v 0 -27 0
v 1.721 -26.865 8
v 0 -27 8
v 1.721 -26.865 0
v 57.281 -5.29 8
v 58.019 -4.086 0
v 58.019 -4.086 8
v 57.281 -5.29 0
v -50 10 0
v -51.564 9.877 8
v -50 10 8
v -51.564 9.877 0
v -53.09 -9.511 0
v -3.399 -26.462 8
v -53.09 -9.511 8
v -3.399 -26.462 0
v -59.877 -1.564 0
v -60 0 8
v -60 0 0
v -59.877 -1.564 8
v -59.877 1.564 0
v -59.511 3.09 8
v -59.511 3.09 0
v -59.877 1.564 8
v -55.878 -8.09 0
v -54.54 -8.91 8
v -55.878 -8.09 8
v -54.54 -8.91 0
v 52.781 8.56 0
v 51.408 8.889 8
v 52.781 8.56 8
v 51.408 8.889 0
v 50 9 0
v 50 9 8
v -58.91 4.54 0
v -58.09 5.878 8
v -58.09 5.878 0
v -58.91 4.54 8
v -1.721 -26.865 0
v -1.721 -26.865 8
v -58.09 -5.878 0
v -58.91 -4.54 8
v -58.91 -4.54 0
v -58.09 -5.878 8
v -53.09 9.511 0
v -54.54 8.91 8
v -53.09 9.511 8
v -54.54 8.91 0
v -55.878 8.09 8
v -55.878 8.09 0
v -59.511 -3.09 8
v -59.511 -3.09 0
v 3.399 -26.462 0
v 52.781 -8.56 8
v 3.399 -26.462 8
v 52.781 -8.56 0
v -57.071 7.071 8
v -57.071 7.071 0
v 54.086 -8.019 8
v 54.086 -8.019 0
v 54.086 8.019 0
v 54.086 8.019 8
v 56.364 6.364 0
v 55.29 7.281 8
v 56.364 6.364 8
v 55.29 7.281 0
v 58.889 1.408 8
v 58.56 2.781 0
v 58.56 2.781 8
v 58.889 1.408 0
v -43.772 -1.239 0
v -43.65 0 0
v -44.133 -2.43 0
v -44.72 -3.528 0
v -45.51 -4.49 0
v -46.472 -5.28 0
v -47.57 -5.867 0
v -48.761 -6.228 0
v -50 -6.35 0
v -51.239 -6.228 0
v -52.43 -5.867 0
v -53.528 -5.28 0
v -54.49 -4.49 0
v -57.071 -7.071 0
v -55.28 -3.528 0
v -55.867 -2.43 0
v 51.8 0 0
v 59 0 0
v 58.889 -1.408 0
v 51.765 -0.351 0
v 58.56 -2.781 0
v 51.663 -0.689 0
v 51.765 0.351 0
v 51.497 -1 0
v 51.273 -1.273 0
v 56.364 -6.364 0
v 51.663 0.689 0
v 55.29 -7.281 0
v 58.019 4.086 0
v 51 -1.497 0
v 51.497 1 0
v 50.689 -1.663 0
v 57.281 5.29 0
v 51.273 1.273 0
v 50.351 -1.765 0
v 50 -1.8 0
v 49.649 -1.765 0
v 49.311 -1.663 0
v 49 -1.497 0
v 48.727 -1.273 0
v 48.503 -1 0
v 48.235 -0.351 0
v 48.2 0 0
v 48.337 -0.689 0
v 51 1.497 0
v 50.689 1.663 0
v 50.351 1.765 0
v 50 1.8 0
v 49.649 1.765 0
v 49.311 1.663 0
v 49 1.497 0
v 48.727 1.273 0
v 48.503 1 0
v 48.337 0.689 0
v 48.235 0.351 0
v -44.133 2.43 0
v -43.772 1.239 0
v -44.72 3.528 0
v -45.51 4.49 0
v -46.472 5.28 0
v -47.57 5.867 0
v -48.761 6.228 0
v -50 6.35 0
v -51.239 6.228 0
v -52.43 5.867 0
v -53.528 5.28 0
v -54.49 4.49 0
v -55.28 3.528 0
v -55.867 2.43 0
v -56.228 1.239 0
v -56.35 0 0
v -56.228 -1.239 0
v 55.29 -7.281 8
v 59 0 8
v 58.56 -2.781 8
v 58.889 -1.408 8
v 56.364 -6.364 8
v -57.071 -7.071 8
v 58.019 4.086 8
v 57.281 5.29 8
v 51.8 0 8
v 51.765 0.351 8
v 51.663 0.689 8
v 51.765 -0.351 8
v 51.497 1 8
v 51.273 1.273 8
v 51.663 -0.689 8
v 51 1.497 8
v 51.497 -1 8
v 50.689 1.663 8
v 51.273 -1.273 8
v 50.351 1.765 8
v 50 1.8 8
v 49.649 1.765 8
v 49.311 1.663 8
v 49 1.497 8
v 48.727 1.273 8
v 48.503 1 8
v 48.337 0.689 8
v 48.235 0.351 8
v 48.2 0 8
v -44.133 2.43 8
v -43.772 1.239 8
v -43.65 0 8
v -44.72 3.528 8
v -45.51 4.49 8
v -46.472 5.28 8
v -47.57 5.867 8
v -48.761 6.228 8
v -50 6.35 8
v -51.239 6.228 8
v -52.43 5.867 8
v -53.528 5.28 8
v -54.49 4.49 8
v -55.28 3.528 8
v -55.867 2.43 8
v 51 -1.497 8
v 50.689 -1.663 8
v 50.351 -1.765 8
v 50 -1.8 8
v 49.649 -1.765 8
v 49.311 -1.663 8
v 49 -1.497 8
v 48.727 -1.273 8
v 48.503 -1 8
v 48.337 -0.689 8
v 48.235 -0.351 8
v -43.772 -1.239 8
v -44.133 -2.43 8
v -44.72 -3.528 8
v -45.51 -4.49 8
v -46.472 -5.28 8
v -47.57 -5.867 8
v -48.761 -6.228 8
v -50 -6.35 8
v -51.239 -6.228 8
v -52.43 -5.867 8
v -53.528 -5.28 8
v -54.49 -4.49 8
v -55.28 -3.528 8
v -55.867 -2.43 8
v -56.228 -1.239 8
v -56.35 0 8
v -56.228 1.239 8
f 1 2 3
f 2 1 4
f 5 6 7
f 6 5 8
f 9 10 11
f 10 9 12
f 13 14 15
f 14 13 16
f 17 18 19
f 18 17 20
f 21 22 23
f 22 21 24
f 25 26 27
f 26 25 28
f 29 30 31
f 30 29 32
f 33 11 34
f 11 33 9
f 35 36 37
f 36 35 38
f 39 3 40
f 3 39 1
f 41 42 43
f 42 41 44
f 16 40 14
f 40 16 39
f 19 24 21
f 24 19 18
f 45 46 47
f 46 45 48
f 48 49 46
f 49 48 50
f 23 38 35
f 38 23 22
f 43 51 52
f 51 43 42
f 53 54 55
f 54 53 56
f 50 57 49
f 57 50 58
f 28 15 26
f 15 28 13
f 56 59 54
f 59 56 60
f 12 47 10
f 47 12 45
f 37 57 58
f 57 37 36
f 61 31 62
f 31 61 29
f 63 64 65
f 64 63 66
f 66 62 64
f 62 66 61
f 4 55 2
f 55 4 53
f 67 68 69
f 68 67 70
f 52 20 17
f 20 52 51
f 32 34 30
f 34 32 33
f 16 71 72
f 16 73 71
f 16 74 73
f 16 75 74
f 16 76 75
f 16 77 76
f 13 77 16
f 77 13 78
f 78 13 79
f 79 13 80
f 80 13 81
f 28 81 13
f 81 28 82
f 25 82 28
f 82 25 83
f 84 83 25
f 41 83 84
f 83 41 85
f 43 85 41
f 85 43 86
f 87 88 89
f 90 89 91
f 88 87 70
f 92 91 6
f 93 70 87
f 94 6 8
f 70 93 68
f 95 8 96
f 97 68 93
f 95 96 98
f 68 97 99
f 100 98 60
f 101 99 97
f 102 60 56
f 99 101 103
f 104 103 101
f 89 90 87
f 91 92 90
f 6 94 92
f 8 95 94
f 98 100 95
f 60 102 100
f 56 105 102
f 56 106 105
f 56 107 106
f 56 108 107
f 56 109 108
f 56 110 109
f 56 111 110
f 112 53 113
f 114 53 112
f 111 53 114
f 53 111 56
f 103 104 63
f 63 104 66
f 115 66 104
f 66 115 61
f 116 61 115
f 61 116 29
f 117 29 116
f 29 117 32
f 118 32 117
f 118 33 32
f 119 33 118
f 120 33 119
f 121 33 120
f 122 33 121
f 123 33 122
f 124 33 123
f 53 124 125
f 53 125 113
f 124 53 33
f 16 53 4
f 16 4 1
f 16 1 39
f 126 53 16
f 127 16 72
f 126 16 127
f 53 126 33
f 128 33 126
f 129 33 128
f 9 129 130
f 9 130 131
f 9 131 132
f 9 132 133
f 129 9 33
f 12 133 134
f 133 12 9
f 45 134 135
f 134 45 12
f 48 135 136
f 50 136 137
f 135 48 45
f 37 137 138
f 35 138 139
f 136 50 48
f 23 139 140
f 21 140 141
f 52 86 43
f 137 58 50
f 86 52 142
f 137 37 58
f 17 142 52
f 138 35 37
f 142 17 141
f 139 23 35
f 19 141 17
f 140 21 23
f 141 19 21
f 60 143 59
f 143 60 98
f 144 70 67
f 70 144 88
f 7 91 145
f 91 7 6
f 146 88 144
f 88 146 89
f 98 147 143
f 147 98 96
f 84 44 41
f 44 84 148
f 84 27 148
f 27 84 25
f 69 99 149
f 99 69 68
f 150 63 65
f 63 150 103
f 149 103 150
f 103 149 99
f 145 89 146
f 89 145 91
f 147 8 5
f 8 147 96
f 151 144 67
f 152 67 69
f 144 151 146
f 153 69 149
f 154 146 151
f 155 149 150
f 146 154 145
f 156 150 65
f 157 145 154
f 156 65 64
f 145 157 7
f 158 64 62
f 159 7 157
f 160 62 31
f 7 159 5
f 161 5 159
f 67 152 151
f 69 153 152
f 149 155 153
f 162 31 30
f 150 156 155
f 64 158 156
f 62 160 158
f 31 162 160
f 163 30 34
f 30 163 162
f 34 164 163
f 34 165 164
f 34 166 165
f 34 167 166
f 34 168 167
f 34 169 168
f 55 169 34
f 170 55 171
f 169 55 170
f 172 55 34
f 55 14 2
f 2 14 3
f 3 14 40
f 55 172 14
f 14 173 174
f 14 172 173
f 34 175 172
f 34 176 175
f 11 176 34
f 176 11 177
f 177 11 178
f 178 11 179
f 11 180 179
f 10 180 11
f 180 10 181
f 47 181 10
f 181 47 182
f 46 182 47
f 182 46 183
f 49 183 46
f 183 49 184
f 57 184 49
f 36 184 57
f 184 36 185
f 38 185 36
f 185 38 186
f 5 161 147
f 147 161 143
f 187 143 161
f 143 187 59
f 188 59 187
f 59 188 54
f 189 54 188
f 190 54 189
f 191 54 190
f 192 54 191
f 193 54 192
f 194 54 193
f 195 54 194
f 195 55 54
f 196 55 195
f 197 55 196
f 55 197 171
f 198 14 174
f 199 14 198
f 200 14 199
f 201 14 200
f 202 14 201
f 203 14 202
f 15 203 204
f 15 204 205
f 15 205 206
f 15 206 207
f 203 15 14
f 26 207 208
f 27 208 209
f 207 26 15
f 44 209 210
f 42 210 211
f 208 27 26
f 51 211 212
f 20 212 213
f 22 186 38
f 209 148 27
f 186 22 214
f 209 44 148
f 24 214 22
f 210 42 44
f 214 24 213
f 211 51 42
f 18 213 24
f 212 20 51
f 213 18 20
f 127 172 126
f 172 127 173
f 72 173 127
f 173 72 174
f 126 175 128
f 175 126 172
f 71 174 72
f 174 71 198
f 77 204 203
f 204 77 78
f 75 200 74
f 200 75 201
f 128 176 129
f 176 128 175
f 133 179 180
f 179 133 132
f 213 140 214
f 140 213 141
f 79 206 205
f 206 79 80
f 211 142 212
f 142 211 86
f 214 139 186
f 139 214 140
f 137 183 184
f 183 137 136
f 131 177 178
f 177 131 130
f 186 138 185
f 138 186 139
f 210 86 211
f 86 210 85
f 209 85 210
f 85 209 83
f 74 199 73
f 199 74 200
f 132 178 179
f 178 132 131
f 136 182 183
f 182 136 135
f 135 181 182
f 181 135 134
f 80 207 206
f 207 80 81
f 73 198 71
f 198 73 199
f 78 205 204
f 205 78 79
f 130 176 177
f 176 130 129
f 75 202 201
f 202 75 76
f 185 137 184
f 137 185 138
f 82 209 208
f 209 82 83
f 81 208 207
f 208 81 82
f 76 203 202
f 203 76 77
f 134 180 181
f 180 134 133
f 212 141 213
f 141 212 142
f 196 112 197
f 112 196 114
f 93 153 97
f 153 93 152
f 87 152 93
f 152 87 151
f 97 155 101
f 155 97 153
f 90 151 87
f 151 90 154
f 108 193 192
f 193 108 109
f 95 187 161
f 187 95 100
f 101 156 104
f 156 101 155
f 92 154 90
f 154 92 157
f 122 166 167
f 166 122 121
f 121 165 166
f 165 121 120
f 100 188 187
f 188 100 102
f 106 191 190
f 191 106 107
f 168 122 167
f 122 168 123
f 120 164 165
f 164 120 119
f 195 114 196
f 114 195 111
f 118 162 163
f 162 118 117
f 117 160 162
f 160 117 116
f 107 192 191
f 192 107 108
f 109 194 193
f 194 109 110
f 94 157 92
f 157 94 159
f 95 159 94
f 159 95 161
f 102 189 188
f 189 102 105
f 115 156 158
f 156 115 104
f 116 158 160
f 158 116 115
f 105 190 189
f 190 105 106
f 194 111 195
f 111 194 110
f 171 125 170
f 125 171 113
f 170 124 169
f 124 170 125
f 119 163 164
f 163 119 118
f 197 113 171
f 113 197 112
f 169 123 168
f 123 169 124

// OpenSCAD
$fn = 32;

// ----------------------------------------------------------------------
// Lever: 100 mm between the bosses, 8 mm thick, smooth outline
// ----------------------------------------------------------------------

// --- parameters (mm) ---
lever_l = 100;            // distance between the boss centres
boss_a = 20;              // first boss diameter
boss_b = 18;              // second boss diameter
bore_a = 12.7;            // first bore
bore_b = 3.6;             // second bore
lever_t = 8;              // lever thickness
boss_c = 22;              // middle boss diameter
bend = 16;                // how far the middle boss drops

lever_profile = [[-60, 0], [-59.877, -1.564], [-59.511, -3.09], [-58.91, -4.54], [-58.09, -5.878], [-57.071, -7.071], [-55.878, -8.09], [-54.54, -8.91], [-53.09, -9.511], [-3.399, -26.462], [-1.721, -26.865], [0, -27], [1.721, -26.865], [3.399, -26.462], [52.781, -8.56], [54.086, -8.019], [55.29, -7.281], [56.364, -6.364], [57.281, -5.29], [58.019, -4.086], [58.56, -2.781], [58.889, -1.408], [59, 0], [58.889, 1.408], [58.56, 2.781], [58.019, 4.086], [57.281, 5.29], [56.364, 6.364], [55.29, 7.281], [54.086, 8.019], [52.781, 8.56], [51.408, 8.889], [50, 9], [-50, 10], [-51.564, 9.877], [-53.09, 9.511], [-54.54, 8.91], [-55.878, 8.09], [-57.071, 7.071], [-58.09, 5.878], [-58.91, 4.54], [-59.511, 3.09], [-59.877, 1.564]];

difference() {
  linear_extrude(height = lever_t) polygon(lever_profile);
  translate([-50, 0, -2.5]) cylinder(h = lever_t + 5, d = bore_a);
  translate([50, 0, -2.5]) cylinder(h = lever_t + 5, d = bore_b);
}
